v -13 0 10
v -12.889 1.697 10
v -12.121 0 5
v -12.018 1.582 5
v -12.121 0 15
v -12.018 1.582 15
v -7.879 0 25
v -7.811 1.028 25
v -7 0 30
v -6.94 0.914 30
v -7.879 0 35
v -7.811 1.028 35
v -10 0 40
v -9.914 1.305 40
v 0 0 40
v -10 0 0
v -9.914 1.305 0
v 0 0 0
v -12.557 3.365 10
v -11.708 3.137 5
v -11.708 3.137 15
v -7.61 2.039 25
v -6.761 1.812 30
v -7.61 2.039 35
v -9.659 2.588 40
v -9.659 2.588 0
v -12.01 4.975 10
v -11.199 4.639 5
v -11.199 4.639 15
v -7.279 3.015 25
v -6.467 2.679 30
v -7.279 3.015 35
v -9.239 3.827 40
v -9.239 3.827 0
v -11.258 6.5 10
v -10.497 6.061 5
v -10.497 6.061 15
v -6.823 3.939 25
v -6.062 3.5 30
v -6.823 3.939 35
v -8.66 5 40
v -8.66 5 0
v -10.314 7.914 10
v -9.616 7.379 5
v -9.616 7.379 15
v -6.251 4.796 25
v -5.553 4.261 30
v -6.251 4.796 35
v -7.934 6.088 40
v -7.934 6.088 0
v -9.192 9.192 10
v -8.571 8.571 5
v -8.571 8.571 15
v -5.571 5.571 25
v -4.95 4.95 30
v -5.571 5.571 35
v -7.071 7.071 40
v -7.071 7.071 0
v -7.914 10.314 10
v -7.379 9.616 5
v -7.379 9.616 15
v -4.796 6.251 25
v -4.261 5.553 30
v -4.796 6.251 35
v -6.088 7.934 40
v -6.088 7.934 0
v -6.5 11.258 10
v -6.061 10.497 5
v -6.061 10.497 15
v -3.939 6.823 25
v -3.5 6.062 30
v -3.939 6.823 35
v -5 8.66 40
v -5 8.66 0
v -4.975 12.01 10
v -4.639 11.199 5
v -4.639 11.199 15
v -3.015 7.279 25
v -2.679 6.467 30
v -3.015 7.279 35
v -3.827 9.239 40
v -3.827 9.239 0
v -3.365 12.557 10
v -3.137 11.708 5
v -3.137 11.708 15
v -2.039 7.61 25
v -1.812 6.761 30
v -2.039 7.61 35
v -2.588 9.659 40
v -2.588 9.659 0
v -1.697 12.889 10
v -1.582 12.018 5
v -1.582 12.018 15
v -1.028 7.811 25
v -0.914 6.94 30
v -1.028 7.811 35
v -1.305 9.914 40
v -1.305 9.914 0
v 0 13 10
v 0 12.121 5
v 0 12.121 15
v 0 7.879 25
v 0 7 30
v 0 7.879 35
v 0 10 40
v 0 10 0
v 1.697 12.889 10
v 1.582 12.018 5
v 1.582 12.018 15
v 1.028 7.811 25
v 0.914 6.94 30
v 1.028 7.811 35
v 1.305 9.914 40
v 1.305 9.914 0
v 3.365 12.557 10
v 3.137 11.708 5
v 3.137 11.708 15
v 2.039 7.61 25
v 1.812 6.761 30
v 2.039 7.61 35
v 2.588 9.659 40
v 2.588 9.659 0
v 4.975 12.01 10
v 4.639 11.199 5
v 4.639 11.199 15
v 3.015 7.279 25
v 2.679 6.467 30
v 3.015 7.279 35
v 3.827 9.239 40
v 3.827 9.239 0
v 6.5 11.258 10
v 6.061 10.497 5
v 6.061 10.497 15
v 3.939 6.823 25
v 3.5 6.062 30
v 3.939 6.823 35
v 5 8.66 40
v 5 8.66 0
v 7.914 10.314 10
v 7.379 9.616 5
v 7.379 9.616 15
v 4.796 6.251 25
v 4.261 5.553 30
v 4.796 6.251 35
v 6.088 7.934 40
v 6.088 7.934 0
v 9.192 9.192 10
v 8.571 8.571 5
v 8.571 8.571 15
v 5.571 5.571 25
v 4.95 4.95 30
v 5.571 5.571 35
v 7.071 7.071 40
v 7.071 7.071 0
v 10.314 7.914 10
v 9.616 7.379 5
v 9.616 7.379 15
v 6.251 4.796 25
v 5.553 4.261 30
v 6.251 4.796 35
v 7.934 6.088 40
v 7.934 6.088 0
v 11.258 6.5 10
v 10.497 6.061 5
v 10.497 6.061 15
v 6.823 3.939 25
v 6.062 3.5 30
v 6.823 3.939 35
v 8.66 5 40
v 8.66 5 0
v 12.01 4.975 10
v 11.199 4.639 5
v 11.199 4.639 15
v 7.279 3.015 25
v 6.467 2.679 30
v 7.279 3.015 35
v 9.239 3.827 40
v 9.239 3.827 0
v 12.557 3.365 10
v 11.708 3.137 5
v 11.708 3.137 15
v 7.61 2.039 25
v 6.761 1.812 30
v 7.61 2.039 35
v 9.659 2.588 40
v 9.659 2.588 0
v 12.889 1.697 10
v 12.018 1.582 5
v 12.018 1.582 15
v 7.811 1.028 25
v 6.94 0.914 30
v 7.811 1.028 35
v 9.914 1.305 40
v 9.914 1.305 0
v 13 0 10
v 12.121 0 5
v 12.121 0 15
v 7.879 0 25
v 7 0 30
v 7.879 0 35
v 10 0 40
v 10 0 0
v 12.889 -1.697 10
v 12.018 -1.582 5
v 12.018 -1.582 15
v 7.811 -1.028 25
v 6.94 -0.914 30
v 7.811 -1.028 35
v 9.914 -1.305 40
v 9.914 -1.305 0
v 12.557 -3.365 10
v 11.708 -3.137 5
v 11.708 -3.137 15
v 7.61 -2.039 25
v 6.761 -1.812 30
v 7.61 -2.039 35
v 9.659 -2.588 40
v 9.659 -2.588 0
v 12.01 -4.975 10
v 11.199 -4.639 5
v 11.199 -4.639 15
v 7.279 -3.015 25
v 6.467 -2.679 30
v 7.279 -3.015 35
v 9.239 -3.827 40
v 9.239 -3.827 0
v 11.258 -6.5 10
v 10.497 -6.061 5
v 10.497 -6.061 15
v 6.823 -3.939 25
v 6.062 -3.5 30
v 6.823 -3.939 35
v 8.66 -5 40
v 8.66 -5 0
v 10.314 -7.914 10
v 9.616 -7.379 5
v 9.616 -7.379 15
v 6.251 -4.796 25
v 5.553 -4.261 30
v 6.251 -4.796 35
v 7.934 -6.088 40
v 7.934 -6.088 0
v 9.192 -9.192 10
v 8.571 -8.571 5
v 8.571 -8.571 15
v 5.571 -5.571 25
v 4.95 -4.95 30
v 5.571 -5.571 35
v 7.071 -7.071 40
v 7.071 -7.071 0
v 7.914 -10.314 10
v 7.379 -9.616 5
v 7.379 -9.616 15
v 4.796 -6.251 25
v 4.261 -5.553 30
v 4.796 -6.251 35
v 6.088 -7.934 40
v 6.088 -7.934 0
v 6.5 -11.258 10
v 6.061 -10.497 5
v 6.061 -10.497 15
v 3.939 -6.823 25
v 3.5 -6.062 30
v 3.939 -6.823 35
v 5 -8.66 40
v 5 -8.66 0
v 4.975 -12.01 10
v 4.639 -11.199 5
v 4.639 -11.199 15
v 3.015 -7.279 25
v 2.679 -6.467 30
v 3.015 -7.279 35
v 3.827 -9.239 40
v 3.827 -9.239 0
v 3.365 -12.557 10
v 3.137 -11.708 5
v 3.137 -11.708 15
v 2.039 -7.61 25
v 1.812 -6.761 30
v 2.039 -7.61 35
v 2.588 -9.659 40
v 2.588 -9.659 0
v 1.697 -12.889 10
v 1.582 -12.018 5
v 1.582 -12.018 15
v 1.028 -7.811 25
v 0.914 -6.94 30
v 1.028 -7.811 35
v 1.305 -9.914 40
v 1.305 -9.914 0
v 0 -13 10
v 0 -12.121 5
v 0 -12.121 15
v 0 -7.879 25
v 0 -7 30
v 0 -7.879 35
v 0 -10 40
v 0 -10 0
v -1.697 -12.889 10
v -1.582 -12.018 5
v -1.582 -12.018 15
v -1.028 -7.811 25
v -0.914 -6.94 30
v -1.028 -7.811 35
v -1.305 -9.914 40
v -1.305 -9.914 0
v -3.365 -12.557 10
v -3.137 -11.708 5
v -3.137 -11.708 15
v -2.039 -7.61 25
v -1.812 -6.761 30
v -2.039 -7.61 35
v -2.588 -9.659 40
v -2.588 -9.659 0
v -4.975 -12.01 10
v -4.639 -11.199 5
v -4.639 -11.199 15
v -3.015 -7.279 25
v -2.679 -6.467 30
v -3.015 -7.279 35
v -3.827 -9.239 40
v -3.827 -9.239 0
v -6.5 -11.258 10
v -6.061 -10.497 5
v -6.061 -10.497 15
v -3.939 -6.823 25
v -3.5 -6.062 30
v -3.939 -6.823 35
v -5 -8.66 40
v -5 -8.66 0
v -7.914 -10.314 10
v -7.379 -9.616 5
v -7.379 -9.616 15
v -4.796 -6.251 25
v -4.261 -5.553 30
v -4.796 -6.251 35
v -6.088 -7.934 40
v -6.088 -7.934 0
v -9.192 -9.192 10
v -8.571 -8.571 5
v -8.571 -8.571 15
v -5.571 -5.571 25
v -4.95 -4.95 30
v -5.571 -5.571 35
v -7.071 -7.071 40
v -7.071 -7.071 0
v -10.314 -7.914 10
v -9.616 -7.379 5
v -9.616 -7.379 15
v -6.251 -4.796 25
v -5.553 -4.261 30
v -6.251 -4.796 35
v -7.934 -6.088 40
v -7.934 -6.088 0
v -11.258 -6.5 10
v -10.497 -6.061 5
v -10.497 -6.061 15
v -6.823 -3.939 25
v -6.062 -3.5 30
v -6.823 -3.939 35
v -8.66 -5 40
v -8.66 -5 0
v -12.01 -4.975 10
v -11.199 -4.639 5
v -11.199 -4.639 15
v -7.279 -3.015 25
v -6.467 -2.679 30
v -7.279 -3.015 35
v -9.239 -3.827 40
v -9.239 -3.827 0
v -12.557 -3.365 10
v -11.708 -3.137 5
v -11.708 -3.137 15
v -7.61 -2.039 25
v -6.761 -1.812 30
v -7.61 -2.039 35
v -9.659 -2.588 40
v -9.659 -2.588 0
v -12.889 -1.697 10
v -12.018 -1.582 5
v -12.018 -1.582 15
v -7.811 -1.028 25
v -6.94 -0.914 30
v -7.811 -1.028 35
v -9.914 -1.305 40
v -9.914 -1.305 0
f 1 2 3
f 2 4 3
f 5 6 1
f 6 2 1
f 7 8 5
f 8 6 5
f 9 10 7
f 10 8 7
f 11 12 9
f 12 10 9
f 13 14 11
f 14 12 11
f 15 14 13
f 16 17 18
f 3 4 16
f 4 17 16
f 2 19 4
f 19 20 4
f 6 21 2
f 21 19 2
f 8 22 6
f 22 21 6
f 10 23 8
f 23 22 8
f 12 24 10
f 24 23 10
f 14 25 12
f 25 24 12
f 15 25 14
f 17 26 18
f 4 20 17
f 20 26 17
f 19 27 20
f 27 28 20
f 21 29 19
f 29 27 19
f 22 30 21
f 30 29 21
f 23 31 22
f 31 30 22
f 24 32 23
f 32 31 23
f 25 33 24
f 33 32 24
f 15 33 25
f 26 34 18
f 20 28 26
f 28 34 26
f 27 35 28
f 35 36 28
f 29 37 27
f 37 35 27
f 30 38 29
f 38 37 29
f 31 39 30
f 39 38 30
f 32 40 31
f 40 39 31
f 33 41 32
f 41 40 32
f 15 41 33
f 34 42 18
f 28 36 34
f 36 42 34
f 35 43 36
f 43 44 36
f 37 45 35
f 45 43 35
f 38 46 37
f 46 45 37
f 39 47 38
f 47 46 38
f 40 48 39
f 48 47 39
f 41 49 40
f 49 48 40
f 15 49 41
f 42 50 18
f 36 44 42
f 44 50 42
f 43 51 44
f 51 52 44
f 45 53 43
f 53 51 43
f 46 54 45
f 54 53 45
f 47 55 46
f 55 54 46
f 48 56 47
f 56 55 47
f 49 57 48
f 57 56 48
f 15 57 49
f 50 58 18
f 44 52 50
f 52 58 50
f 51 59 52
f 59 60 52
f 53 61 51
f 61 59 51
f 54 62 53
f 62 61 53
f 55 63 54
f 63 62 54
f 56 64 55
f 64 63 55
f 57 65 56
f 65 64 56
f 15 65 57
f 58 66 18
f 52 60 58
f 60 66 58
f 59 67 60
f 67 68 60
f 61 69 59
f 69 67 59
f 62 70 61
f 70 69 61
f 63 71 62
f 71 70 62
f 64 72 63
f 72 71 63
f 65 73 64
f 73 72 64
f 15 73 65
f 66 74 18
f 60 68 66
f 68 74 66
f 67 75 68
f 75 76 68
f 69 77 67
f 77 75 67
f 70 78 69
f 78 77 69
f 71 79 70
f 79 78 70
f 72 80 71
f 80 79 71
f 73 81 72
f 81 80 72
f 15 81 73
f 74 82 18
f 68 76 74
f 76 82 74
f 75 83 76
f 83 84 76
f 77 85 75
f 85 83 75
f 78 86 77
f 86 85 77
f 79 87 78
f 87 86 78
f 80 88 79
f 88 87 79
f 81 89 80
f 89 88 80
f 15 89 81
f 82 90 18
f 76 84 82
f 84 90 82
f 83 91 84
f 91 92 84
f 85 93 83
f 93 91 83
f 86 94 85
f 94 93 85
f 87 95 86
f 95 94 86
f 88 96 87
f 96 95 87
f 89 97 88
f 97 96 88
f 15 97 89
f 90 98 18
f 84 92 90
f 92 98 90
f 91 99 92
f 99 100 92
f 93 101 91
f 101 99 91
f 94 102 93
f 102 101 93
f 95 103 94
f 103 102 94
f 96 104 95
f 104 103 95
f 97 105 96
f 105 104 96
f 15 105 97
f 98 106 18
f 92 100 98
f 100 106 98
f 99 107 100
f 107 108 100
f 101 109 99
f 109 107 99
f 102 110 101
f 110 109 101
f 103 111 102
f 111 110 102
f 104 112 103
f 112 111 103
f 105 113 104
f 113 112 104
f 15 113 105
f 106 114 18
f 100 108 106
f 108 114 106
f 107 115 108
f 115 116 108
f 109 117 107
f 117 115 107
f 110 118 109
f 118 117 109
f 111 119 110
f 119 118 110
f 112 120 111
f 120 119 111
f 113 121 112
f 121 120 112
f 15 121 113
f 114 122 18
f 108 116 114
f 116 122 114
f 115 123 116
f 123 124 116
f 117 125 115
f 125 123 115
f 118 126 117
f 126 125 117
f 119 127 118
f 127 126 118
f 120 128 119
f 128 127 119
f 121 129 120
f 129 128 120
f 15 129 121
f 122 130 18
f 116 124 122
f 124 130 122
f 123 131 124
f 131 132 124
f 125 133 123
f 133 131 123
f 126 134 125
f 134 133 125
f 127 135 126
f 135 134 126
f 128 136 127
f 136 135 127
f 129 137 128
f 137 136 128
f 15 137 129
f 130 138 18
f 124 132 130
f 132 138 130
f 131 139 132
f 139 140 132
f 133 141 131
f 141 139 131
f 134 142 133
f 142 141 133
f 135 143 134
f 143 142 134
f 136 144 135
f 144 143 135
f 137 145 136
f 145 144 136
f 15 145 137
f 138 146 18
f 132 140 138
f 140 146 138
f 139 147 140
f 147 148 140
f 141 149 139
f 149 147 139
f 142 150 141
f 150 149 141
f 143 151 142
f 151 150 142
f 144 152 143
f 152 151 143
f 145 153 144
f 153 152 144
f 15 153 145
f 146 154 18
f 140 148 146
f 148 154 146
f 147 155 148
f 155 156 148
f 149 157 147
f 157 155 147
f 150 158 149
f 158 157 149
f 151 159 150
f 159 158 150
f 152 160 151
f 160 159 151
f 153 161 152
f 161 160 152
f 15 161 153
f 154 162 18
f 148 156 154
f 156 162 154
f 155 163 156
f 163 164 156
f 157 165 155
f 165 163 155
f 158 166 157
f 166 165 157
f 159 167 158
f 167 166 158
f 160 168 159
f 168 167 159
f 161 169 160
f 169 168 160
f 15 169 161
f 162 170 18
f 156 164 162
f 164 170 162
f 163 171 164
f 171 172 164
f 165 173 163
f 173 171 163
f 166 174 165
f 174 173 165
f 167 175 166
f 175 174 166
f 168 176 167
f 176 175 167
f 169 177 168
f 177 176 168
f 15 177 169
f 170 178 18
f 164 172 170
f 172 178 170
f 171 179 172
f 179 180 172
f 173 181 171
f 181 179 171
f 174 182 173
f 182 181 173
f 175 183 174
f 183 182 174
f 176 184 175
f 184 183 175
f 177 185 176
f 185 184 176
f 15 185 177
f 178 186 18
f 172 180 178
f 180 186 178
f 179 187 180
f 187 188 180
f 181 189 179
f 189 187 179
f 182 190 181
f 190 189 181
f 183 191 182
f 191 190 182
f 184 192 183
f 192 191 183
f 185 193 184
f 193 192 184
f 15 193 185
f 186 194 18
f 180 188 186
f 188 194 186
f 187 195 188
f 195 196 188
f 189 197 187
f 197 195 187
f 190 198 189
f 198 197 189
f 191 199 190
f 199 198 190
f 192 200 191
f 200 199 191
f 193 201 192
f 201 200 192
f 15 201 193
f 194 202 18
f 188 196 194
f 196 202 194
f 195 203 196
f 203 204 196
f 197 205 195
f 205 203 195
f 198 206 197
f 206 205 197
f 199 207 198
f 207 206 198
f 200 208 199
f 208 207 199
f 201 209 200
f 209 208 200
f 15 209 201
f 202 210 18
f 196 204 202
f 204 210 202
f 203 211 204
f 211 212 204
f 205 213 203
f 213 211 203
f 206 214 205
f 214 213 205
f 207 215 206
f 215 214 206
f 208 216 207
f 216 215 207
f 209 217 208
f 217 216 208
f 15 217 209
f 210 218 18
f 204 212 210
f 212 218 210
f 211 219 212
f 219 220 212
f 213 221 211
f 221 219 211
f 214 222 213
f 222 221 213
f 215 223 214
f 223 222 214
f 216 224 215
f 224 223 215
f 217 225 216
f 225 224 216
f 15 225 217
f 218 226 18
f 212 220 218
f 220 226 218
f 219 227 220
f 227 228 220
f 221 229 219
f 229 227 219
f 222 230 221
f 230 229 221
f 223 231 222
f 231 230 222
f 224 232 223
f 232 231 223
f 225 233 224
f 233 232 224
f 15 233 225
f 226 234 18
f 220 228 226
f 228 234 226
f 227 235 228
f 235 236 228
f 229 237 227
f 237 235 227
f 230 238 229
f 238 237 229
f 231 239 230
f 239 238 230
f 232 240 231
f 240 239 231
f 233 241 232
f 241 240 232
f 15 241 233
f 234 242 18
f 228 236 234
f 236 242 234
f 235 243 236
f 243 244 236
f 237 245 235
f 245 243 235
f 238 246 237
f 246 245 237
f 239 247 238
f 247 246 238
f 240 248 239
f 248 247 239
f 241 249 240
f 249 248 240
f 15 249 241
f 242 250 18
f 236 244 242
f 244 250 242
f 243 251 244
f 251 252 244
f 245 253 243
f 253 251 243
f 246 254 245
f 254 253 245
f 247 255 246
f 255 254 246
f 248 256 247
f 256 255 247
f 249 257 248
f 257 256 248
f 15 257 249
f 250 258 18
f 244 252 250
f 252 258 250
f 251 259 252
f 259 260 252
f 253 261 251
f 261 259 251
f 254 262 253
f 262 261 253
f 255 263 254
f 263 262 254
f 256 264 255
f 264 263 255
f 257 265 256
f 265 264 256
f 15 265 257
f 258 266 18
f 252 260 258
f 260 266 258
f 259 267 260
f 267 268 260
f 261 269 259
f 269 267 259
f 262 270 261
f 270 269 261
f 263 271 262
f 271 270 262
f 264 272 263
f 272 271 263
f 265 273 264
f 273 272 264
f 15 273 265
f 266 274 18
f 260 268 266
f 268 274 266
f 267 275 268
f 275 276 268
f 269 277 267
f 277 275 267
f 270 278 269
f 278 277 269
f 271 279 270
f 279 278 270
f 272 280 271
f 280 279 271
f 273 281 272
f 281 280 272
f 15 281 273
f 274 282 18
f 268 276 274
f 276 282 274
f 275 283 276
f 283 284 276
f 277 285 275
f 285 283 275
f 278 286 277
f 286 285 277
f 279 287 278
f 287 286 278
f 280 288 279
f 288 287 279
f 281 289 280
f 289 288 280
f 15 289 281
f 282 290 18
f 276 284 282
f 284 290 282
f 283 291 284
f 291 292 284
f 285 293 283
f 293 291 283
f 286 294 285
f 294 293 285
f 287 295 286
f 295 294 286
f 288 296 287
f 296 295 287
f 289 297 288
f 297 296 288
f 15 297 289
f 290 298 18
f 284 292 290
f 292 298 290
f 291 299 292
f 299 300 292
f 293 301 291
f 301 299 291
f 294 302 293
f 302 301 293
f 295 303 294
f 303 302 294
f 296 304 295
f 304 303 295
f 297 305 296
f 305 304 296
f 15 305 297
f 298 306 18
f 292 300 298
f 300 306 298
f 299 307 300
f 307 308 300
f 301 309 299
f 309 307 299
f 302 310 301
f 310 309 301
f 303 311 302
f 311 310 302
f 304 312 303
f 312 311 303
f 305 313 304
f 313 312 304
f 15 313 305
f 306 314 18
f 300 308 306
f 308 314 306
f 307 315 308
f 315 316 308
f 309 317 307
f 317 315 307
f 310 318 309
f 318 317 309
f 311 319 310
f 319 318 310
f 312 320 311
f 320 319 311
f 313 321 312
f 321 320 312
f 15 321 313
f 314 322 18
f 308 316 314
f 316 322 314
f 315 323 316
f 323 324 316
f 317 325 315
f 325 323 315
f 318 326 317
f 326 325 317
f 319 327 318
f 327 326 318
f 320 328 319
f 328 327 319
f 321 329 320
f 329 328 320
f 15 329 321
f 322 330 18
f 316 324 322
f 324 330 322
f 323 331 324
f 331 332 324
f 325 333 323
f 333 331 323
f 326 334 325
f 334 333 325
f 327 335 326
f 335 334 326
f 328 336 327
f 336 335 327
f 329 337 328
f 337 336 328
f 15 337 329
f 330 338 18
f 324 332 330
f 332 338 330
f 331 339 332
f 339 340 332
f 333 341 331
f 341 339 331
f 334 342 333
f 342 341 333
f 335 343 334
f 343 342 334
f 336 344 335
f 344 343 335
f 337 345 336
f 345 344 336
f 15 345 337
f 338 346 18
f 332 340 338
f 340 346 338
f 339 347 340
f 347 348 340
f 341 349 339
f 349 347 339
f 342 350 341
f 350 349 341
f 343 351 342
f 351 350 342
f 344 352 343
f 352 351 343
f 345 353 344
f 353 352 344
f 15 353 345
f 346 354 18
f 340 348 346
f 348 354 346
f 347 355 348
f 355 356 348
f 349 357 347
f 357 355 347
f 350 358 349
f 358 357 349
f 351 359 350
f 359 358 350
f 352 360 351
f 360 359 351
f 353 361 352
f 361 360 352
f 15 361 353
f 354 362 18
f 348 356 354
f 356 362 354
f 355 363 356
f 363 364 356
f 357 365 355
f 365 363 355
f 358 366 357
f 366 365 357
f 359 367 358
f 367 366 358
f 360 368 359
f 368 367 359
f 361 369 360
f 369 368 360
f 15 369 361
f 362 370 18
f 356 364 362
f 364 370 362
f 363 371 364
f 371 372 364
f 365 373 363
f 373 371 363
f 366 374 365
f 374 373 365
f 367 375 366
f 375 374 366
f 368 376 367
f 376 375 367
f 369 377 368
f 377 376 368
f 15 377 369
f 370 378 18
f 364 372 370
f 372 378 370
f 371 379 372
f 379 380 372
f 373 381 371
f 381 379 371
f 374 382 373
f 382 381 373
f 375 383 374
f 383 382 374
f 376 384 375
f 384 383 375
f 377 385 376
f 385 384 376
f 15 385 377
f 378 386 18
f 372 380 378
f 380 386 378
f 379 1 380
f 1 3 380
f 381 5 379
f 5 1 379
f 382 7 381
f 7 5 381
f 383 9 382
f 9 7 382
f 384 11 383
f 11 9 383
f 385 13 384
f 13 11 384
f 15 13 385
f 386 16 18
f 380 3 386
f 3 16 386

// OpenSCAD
// rotate_extrude of a profile computed by a function.
function profile(h, steps) = concat(
  [[0, 0]],
  [for (i = [0:steps]) [10 + 3 * sin(i * 360 / steps), h * i / steps]],
  [[0, h]]
);
p = profile(40, 8);
echo(p);
rotate_extrude($fn = 48) polygon(p);
